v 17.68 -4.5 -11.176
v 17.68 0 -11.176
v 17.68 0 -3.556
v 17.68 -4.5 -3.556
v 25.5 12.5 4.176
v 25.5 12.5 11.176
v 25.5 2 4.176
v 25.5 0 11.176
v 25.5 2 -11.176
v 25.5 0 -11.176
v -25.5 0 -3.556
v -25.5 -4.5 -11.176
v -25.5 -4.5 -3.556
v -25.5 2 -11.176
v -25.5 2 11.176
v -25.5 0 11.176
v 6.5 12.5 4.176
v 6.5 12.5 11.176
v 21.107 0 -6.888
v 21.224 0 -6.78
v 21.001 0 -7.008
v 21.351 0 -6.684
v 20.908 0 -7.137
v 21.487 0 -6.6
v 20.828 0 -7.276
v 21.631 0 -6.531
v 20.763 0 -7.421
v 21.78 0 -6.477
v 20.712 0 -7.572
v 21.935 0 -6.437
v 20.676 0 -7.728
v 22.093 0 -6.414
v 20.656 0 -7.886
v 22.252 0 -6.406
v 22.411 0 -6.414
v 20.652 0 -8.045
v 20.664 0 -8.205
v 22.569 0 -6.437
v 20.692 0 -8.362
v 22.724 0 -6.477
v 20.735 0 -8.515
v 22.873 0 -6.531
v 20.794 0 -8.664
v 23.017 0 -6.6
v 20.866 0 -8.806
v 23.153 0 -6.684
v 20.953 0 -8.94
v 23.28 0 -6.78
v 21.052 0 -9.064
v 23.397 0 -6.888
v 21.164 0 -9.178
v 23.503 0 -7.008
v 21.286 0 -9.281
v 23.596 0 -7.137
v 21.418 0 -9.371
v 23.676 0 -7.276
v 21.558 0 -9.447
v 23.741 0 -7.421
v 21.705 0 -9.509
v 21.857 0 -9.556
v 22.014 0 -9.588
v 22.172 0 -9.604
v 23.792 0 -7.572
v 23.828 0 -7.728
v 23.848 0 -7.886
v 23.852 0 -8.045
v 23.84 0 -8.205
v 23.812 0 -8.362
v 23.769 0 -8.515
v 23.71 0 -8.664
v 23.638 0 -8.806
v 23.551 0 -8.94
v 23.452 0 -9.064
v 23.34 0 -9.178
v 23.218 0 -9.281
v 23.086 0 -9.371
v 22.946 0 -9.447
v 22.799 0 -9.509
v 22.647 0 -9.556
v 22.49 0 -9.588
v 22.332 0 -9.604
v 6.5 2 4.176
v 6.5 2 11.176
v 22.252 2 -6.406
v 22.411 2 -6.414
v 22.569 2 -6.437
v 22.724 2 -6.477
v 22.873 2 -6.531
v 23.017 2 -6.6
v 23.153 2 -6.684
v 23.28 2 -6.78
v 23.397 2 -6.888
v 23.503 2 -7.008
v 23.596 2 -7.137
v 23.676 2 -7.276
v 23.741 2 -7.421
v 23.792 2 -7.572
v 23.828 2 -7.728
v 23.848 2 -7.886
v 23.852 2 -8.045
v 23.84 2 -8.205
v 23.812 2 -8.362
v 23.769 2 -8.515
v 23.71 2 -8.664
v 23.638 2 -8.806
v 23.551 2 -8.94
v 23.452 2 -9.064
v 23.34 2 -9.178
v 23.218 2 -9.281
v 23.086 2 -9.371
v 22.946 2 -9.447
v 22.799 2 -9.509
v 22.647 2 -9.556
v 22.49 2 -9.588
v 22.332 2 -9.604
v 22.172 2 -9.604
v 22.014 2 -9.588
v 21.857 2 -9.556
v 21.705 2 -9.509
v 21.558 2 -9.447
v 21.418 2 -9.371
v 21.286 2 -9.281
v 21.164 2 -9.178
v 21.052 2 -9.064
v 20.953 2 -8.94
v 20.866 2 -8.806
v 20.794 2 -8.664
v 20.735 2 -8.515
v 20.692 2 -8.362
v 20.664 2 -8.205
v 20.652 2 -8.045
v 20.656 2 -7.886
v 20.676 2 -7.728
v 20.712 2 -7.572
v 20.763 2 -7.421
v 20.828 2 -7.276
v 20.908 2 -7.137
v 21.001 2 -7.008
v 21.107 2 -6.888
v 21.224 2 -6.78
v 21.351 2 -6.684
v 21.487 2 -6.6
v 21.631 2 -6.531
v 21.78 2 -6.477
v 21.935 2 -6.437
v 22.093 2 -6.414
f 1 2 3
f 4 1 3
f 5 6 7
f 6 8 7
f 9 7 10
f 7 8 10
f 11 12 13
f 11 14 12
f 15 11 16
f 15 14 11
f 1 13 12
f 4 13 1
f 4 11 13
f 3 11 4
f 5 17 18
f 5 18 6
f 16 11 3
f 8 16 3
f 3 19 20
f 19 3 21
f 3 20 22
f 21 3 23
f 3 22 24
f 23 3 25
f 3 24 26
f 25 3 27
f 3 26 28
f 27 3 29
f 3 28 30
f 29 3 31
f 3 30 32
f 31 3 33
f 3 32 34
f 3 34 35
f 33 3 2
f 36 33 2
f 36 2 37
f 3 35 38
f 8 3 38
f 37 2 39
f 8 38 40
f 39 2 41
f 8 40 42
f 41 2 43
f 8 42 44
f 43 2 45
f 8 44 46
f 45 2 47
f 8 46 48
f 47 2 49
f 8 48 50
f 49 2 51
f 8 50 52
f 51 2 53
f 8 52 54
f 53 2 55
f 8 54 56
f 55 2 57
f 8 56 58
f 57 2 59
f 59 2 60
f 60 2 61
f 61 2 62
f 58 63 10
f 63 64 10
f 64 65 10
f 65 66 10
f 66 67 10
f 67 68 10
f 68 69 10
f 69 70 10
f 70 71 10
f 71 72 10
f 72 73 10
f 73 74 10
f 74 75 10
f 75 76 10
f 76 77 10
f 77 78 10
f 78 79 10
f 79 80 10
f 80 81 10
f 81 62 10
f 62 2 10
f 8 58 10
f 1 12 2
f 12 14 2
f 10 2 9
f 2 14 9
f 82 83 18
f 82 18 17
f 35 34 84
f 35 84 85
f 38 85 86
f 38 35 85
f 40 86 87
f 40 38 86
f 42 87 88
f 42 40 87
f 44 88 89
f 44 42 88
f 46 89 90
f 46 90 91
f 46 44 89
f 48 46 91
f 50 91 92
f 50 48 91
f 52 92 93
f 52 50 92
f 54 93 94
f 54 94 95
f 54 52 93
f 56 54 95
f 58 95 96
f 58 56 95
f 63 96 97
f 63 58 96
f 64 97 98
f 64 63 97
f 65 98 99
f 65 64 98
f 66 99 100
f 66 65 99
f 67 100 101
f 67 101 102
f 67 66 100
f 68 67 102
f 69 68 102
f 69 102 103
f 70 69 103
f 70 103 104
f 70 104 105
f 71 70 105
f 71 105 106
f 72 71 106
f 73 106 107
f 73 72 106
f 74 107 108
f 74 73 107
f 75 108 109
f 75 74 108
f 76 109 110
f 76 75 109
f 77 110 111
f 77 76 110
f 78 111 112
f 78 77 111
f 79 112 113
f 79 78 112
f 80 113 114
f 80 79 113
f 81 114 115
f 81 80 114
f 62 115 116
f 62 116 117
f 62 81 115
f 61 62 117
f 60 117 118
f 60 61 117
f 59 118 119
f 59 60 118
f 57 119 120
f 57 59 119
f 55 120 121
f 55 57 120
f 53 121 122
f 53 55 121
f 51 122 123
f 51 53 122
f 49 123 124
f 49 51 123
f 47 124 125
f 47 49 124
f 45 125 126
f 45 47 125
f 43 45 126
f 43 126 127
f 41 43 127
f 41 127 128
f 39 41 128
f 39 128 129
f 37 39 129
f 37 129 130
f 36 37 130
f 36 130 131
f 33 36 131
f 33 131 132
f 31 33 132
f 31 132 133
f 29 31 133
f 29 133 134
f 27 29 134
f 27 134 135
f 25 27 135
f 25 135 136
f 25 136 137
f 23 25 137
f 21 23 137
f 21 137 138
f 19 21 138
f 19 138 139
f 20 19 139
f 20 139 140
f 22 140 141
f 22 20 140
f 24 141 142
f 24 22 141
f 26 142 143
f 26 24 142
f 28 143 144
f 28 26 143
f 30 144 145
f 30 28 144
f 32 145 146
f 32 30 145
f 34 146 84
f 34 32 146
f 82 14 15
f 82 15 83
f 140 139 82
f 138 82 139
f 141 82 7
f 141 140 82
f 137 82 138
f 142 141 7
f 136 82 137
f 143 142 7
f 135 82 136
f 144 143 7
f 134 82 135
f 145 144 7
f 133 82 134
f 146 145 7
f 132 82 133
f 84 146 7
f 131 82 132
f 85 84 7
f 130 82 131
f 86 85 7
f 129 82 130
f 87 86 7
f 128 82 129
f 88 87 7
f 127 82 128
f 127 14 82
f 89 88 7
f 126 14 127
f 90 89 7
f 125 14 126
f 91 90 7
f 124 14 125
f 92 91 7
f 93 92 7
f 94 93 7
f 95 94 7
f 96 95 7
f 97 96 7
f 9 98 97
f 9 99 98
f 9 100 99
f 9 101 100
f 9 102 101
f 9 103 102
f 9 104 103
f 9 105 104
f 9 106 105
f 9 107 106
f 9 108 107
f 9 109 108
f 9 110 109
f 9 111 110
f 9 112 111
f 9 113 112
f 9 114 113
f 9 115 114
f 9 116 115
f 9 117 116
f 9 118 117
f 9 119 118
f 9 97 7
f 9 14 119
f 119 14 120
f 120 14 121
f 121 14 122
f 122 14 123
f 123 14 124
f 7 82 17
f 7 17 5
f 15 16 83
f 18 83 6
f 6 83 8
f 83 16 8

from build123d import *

# Parameters (mm, degrees)
SKETCH1_W           = 51
SKETCH1_H           = 22.352
SKETCH1_R           = 1.6
BOSS_EXTRUDE1_DEPTH = 2
SKETCH2_W           = 19
SKETCH2_H           = 7
BOSS_EXTRUDE2_DEPTH = 10.5
SKETCH3_W           = 43.18
SKETCH3_H           = 7.62
BOSS_EXTRUDE3_DEPTH = 4.5


with BuildPart() as part:
    # Sketch1 → Boss-Extrude1 (new body)
    with BuildSketch(Plane(origin=(0, 0, 0), x_dir=(1, 0, 0), z_dir=(0, 1, 0))):
        Rectangle(SKETCH1_W, SKETCH1_H)
        with Locations(Location((22.252, 8.005562403, 0), (0, 0, 270))):
            Circle(SKETCH1_R, mode=Mode.SUBTRACT)
    extrude(amount=BOSS_EXTRUDE1_DEPTH)

    # Sketch2 → Boss-Extrude2 (add)
    with BuildSketch(Plane(origin=(0, 2, 0), x_dir=(1, 0, 0), z_dir=(0, 1, 0))):
        with Locations((16, -7.676)):
            Rectangle(SKETCH2_W, SKETCH2_H)
    extrude(amount=BOSS_EXTRUDE2_DEPTH)

    # Sketch3 → Boss-Extrude3 (add)
    with BuildSketch(Plane.XZ):
        with Locations((-3.91, -7.366)):
            Rectangle(SKETCH3_W, SKETCH3_H)
    extrude(amount=BOSS_EXTRUDE3_DEPTH)


solid = part.part
